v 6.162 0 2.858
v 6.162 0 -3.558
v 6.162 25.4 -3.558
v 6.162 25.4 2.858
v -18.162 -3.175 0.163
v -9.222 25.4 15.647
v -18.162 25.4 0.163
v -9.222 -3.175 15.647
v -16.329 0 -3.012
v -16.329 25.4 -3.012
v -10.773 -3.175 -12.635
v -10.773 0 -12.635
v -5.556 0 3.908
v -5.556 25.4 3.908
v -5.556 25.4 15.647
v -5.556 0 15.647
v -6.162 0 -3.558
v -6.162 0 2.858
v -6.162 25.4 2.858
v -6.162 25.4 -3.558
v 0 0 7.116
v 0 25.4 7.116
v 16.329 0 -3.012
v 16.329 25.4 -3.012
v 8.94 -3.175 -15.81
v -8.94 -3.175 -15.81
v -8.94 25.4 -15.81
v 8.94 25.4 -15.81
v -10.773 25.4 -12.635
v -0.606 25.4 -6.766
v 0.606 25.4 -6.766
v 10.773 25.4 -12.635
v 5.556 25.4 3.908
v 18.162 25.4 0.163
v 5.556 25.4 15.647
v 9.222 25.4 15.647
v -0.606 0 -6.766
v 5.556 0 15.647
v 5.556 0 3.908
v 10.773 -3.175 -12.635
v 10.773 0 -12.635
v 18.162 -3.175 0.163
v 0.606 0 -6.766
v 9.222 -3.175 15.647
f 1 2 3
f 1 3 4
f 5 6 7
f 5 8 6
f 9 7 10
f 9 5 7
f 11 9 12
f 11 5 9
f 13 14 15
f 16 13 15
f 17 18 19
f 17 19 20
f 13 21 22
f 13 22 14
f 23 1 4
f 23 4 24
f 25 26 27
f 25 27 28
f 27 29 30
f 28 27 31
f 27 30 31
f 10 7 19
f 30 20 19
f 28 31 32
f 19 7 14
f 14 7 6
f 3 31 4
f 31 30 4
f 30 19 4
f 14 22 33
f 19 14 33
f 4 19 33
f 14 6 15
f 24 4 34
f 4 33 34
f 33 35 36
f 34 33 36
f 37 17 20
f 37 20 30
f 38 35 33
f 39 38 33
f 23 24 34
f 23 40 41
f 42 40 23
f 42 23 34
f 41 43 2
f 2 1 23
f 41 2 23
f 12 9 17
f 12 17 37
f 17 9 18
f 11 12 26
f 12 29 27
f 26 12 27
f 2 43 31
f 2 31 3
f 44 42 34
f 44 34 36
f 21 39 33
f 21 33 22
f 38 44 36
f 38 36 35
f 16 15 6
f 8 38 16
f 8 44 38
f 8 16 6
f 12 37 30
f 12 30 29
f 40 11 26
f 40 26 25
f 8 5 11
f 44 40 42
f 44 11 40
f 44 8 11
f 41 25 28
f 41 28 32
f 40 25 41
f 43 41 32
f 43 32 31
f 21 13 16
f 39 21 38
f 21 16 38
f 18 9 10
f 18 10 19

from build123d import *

# Parameters (mm, degrees)
F2_DEPTH = 3.175
F3_DEPTH = 25.4


# Not quite as in the source:
# - a feature names something its author has since deleted; it is built from what else it names


with BuildPart() as f2:
    # F1 (on Front) → F2 (new body)
    with BuildSketch(Plane.XZ):
        Polygon((-18.1618179038, 0.1631008549), (-16.3287307991, -3.0118991451), (-6.1622247723, 2.8577358462), (-6.1622247723, 3.5577621311), (-5.5559842263, 3.9077752735), (-5.5559842263, 15.6470452561), (-9.2221584356, 15.6470452561), align=None)
        Polygon((6.1622247723, 2.8577358462), (16.3287307991, -3.0118991451), (18.1618179038, 0.1631008549), (9.2221584356, 15.6470452561), (5.5559842263, 15.6470452561), (5.5559842263, 3.9077752735), (6.1622247723, 3.5577621311), align=None)
        Polygon((-0.606240546, -6.7655111197), (-10.7727465728, -12.635146111), (-8.9396594682, -15.810146111), (8.9396594682, -15.810146111), (10.7727465728, -12.635146111), (0.606240546, -6.7655111197), (0, -7.1155242622), align=None)
        Polygon((5.5559842263, 3.2077489886), (6.1622247723, 2.8577358462), (6.1622247723, 3.5577621311), (5.5559842263, 3.9077752735), align=None)
        Polygon((-6.1622247723, 3.5577621311), (-6.1622247723, 2.8577358462), (-5.5559842263, 3.2077489886), (-5.5559842263, 3.9077752735), align=None)
        Polygon((0, -6.4154979773), (-0.606240546, -6.7655111197), (0, -7.1155242622), (0.606240546, -6.7655111197), align=None)
        Polygon((-6.1622247723, -3.5577621311), (-0.606240546, -6.7655111197), (0, -6.4154979773), (0.606240546, -6.7655111197), (6.1622247723, -3.5577621311), (6.1622247723, 2.8577358462), (5.5559842263, 3.2077489886), (5.5559842263, 3.9077752735), (0, 7.1155242622), (-5.5559842263, 3.9077752735), (-5.5559842263, 3.2077489886), (-6.1622247723, 2.8577358462), align=None)
        Polygon((5.5559842263, 15.6470452561), (-5.5559842263, 15.6470452561), (-5.5559842263, 3.9077752735), (0, 7.1155242622), (5.5559842263, 3.9077752735), align=None)
        Polygon((-16.3287307991, -3.0118991451), (-10.7727465728, -12.635146111), (-0.606240546, -6.7655111197), (-6.1622247723, -3.5577621311), (-6.1622247723, 2.8577358462), align=None)
        Polygon((0.606240546, -6.7655111197), (10.7727465728, -12.635146111), (16.3287307991, -3.0118991451), (6.1622247723, 2.8577358462), (6.1622247723, -3.5577621311), align=None)
    extrude(amount=F2_DEPTH)

    # F1 (on Front) → F3 (join)
    with BuildSketch(Plane.XZ):
        Polygon((-18.1618179038, 0.1631008549), (-16.3287307991, -3.0118991451), (-6.1622247723, 2.8577358462), (-6.1622247723, 3.5577621311), (-5.5559842263, 3.9077752735), (-5.5559842263, 15.6470452561), (-9.2221584356, 15.6470452561), align=None)
        Polygon((-0.606240546, -6.7655111197), (-10.7727465728, -12.635146111), (-8.9396594682, -15.810146111), (8.9396594682, -15.810146111), (10.7727465728, -12.635146111), (0.606240546, -6.7655111197), (0, -7.1155242622), align=None)
        Polygon((6.1622247723, 2.8577358462), (16.3287307991, -3.0118991451), (18.1618179038, 0.1631008549), (9.2221584356, 15.6470452561), (5.5559842263, 15.6470452561), (5.5559842263, 3.9077752735), (6.1622247723, 3.5577621311), align=None)
        Polygon((-6.1622247723, -3.5577621311), (-0.606240546, -6.7655111197), (0, -6.4154979773), (0.606240546, -6.7655111197), (6.1622247723, -3.5577621311), (6.1622247723, 2.8577358462), (5.5559842263, 3.2077489886), (5.5559842263, 3.9077752735), (0, 7.1155242622), (-5.5559842263, 3.9077752735), (-5.5559842263, 3.2077489886), (-6.1622247723, 2.8577358462), align=None)
        Polygon((5.5559842263, 3.2077489886), (6.1622247723, 2.8577358462), (6.1622247723, 3.5577621311), (5.5559842263, 3.9077752735), align=None)
        Polygon((0, -6.4154979773), (-0.606240546, -6.7655111197), (0, -7.1155242622), (0.606240546, -6.7655111197), align=None)
        Polygon((-6.1622247723, 3.5577621311), (-6.1622247723, 2.8577358462), (-5.5559842263, 3.2077489886), (-5.5559842263, 3.9077752735), align=None)
    extrude(amount=-F3_DEPTH)


solid = f2.part
